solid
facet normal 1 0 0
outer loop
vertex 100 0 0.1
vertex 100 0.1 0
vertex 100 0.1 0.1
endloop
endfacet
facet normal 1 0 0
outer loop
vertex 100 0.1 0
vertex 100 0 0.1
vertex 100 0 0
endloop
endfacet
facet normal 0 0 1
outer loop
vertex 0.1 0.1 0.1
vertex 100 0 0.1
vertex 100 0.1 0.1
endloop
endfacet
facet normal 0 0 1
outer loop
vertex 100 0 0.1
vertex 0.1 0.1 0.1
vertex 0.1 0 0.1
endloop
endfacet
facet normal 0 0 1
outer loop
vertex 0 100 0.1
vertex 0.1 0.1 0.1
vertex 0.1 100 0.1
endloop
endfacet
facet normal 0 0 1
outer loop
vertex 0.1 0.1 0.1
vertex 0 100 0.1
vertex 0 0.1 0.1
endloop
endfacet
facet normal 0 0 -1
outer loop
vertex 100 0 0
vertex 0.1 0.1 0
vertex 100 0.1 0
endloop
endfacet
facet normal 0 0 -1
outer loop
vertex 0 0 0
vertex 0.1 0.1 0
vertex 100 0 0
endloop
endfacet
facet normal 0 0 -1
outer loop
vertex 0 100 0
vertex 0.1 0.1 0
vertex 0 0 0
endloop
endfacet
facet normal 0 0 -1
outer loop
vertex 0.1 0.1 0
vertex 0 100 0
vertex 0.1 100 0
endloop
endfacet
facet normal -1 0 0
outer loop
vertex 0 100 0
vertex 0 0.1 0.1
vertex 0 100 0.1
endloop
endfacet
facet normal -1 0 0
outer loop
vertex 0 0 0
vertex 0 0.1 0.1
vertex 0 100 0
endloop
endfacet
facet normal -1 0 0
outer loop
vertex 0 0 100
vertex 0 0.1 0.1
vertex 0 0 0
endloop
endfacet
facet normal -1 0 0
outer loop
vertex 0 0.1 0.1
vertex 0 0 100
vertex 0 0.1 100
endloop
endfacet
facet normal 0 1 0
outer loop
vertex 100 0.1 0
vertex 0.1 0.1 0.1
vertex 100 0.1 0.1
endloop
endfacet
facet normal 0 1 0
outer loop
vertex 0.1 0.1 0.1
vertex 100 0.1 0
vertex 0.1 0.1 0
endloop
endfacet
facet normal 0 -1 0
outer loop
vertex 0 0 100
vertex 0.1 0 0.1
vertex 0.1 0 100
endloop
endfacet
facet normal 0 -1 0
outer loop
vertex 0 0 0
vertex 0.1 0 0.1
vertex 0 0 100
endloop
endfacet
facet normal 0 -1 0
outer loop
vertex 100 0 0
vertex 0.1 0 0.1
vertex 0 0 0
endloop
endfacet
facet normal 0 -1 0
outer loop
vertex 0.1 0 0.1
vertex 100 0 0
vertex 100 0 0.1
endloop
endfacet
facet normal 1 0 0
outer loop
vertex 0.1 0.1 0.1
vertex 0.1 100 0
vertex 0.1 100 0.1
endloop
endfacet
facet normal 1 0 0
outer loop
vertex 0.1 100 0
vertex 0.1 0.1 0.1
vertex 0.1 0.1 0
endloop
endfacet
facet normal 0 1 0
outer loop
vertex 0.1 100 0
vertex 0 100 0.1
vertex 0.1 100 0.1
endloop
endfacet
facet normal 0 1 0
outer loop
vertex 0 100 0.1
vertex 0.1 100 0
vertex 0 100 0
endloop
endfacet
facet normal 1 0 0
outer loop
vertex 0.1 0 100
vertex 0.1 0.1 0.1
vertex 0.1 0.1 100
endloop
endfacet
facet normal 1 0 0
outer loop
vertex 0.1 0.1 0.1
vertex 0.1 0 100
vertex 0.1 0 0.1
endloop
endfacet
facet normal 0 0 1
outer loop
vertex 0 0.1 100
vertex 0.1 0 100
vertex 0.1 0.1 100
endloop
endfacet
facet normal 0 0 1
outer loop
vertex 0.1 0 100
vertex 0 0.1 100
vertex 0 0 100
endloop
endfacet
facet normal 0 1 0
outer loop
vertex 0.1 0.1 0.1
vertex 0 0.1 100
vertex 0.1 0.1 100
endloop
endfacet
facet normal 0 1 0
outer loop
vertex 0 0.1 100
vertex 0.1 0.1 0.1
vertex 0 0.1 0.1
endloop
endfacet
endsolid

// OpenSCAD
    // Combined Scene

    // Permanent Model
    
    // Permanent Model (Black)
    color([0, 0, 0]) {
        // Your permanent model code here
        cube([100,0.1,0.1], center = false);
        cube([0.1,100,0.1], center = false);
        cube([0.1,0.1,100], center = false);
    }
    

    // Dynamic Model
    union() {
    // Seat with a slight curve for comfort
    translate([0, 0, 5])
    difference() {
        hull() {
            translate([-25, -25, 0]) circle(r=25);
            translate([25, -25, 0]) circle(r=25);
            translate([-25, 25, 0]) circle(r=25);
            translate([25, 25, 0]) circle(r=25);
        }
        translate([0, 0, -1])
        hull() {
            translate([-24, -24, 0]) circle(r=24);
            translate([24, -24, 0]) circle(r=24);
            translate([-24, 24, 0]) circle(r=24);
            translate([24, 24, 0]) circle(r=24);
        }
    }

    // Ergonomic backrest
    translate([0, -25, 15])
    rotate([15, 0, 0])
    linear_extrude(height=30) {
        polygon(points=[[0,0], [-25,30], [25,30]]);
    }

    // Front legs with a tapered design
    translate([-15, -15, 0])
    linear_extrude(height=25) {
        polygon(points=[[0,0], [5,0], [3,-10], [-3,-10], [-5,0]]);
    } 
    translate([-15, 15, 0])
    linear_extrude(height=25) {
        polygon(points=[[0,0], [5,0], [3,-10], [-3,-10], [-5,0]]);
    } 

    // Rear legs with a slightly larger tapered design
    translate([15, -15, 0])
    linear_extrude(height=30) {
        polygon(points=[[0,0], [6,0], [4,-12], [-4,-12], [-6,0]]);
    } 
    translate([15, 15, 0])
    linear_extrude(height=30) {
        polygon(points=[[0,0], [6,0], [4,-12], [-4,-12], [-6,0]]);
    }

    // Optional curved armrests
    translate([-30, 0, 15])
    rotate([0, 0, 30])
    linear_extrude(height=5)
    offset(r=5) {
        polygon(points=[[0,0], [25,0], [20,-5], [5,-5]]);
    }
    translate([30, 0, 15])
    rotate([0, 0, -30])
    linear_extrude(height=5)
    offset(r=5) {
        polygon(points=[[0,0], [25,0], [20,-5], [5,-5]]);
    }
}
    
